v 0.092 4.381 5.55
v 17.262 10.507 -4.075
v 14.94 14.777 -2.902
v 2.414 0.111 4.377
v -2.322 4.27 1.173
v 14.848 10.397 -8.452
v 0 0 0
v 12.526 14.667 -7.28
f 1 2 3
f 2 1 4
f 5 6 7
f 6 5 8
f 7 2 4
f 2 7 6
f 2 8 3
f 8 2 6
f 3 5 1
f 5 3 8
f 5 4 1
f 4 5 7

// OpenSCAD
// Rz . Ry . Rx order, which is the one that is easy to get backwards
rotate([15, 25, 35]) cube([20, 5, 5]);
